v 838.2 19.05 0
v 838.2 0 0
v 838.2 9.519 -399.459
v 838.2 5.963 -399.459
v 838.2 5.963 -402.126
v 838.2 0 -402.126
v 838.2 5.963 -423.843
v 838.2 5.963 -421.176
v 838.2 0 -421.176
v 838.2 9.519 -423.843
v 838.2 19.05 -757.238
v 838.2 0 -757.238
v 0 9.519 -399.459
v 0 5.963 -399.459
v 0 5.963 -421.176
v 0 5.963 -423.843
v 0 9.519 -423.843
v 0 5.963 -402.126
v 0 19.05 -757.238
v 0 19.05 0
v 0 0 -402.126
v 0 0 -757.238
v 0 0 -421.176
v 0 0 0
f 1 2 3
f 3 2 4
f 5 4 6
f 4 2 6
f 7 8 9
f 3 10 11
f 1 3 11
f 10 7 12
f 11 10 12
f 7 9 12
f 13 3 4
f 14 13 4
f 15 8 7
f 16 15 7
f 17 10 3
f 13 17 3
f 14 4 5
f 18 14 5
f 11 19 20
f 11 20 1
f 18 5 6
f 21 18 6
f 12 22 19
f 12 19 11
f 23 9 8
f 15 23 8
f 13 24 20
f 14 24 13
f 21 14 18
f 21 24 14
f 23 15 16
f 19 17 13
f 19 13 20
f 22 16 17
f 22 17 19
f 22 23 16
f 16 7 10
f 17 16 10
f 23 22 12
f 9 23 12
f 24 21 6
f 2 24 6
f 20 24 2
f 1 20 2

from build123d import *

# Parameters (mm, degrees)
SKETCH1_W           = 838.2
SKETCH1_H           = 757.2375
BOSS_EXTRUDE1_DEPTH = 19.05
CUT_EXTRUDE1_DEPTH  = 839.2


with BuildPart() as part:
    # Sketch1 → Boss-Extrude1 (new body)
    with BuildSketch(Plane(origin=(0, 0, 0), x_dir=(1, 0, 0), z_dir=(0, 1, 0))):
        with Locations((419.1, 378.61875)):
            Rectangle(SKETCH1_W, SKETCH1_H)
    extrude(amount=BOSS_EXTRUDE1_DEPTH)

    # Sketch3 → Cut-Extrude1 (cut, through all)
    with BuildSketch(Plane(origin=(838.2, 0, 0), x_dir=(0, 0, -1), z_dir=(1, 0, 0))):
        Polygon((421.17645, 0), (421.17645, 5.96265), (423.84345, 5.96265), (423.84345, 9.51865), (399.45945, 9.51865), (399.45945, 5.96265), (402.12645, 5.96265), (402.12645, 0), align=None)
    extrude(amount=-CUT_EXTRUDE1_DEPTH, mode=Mode.SUBTRACT)


solid = part.part
